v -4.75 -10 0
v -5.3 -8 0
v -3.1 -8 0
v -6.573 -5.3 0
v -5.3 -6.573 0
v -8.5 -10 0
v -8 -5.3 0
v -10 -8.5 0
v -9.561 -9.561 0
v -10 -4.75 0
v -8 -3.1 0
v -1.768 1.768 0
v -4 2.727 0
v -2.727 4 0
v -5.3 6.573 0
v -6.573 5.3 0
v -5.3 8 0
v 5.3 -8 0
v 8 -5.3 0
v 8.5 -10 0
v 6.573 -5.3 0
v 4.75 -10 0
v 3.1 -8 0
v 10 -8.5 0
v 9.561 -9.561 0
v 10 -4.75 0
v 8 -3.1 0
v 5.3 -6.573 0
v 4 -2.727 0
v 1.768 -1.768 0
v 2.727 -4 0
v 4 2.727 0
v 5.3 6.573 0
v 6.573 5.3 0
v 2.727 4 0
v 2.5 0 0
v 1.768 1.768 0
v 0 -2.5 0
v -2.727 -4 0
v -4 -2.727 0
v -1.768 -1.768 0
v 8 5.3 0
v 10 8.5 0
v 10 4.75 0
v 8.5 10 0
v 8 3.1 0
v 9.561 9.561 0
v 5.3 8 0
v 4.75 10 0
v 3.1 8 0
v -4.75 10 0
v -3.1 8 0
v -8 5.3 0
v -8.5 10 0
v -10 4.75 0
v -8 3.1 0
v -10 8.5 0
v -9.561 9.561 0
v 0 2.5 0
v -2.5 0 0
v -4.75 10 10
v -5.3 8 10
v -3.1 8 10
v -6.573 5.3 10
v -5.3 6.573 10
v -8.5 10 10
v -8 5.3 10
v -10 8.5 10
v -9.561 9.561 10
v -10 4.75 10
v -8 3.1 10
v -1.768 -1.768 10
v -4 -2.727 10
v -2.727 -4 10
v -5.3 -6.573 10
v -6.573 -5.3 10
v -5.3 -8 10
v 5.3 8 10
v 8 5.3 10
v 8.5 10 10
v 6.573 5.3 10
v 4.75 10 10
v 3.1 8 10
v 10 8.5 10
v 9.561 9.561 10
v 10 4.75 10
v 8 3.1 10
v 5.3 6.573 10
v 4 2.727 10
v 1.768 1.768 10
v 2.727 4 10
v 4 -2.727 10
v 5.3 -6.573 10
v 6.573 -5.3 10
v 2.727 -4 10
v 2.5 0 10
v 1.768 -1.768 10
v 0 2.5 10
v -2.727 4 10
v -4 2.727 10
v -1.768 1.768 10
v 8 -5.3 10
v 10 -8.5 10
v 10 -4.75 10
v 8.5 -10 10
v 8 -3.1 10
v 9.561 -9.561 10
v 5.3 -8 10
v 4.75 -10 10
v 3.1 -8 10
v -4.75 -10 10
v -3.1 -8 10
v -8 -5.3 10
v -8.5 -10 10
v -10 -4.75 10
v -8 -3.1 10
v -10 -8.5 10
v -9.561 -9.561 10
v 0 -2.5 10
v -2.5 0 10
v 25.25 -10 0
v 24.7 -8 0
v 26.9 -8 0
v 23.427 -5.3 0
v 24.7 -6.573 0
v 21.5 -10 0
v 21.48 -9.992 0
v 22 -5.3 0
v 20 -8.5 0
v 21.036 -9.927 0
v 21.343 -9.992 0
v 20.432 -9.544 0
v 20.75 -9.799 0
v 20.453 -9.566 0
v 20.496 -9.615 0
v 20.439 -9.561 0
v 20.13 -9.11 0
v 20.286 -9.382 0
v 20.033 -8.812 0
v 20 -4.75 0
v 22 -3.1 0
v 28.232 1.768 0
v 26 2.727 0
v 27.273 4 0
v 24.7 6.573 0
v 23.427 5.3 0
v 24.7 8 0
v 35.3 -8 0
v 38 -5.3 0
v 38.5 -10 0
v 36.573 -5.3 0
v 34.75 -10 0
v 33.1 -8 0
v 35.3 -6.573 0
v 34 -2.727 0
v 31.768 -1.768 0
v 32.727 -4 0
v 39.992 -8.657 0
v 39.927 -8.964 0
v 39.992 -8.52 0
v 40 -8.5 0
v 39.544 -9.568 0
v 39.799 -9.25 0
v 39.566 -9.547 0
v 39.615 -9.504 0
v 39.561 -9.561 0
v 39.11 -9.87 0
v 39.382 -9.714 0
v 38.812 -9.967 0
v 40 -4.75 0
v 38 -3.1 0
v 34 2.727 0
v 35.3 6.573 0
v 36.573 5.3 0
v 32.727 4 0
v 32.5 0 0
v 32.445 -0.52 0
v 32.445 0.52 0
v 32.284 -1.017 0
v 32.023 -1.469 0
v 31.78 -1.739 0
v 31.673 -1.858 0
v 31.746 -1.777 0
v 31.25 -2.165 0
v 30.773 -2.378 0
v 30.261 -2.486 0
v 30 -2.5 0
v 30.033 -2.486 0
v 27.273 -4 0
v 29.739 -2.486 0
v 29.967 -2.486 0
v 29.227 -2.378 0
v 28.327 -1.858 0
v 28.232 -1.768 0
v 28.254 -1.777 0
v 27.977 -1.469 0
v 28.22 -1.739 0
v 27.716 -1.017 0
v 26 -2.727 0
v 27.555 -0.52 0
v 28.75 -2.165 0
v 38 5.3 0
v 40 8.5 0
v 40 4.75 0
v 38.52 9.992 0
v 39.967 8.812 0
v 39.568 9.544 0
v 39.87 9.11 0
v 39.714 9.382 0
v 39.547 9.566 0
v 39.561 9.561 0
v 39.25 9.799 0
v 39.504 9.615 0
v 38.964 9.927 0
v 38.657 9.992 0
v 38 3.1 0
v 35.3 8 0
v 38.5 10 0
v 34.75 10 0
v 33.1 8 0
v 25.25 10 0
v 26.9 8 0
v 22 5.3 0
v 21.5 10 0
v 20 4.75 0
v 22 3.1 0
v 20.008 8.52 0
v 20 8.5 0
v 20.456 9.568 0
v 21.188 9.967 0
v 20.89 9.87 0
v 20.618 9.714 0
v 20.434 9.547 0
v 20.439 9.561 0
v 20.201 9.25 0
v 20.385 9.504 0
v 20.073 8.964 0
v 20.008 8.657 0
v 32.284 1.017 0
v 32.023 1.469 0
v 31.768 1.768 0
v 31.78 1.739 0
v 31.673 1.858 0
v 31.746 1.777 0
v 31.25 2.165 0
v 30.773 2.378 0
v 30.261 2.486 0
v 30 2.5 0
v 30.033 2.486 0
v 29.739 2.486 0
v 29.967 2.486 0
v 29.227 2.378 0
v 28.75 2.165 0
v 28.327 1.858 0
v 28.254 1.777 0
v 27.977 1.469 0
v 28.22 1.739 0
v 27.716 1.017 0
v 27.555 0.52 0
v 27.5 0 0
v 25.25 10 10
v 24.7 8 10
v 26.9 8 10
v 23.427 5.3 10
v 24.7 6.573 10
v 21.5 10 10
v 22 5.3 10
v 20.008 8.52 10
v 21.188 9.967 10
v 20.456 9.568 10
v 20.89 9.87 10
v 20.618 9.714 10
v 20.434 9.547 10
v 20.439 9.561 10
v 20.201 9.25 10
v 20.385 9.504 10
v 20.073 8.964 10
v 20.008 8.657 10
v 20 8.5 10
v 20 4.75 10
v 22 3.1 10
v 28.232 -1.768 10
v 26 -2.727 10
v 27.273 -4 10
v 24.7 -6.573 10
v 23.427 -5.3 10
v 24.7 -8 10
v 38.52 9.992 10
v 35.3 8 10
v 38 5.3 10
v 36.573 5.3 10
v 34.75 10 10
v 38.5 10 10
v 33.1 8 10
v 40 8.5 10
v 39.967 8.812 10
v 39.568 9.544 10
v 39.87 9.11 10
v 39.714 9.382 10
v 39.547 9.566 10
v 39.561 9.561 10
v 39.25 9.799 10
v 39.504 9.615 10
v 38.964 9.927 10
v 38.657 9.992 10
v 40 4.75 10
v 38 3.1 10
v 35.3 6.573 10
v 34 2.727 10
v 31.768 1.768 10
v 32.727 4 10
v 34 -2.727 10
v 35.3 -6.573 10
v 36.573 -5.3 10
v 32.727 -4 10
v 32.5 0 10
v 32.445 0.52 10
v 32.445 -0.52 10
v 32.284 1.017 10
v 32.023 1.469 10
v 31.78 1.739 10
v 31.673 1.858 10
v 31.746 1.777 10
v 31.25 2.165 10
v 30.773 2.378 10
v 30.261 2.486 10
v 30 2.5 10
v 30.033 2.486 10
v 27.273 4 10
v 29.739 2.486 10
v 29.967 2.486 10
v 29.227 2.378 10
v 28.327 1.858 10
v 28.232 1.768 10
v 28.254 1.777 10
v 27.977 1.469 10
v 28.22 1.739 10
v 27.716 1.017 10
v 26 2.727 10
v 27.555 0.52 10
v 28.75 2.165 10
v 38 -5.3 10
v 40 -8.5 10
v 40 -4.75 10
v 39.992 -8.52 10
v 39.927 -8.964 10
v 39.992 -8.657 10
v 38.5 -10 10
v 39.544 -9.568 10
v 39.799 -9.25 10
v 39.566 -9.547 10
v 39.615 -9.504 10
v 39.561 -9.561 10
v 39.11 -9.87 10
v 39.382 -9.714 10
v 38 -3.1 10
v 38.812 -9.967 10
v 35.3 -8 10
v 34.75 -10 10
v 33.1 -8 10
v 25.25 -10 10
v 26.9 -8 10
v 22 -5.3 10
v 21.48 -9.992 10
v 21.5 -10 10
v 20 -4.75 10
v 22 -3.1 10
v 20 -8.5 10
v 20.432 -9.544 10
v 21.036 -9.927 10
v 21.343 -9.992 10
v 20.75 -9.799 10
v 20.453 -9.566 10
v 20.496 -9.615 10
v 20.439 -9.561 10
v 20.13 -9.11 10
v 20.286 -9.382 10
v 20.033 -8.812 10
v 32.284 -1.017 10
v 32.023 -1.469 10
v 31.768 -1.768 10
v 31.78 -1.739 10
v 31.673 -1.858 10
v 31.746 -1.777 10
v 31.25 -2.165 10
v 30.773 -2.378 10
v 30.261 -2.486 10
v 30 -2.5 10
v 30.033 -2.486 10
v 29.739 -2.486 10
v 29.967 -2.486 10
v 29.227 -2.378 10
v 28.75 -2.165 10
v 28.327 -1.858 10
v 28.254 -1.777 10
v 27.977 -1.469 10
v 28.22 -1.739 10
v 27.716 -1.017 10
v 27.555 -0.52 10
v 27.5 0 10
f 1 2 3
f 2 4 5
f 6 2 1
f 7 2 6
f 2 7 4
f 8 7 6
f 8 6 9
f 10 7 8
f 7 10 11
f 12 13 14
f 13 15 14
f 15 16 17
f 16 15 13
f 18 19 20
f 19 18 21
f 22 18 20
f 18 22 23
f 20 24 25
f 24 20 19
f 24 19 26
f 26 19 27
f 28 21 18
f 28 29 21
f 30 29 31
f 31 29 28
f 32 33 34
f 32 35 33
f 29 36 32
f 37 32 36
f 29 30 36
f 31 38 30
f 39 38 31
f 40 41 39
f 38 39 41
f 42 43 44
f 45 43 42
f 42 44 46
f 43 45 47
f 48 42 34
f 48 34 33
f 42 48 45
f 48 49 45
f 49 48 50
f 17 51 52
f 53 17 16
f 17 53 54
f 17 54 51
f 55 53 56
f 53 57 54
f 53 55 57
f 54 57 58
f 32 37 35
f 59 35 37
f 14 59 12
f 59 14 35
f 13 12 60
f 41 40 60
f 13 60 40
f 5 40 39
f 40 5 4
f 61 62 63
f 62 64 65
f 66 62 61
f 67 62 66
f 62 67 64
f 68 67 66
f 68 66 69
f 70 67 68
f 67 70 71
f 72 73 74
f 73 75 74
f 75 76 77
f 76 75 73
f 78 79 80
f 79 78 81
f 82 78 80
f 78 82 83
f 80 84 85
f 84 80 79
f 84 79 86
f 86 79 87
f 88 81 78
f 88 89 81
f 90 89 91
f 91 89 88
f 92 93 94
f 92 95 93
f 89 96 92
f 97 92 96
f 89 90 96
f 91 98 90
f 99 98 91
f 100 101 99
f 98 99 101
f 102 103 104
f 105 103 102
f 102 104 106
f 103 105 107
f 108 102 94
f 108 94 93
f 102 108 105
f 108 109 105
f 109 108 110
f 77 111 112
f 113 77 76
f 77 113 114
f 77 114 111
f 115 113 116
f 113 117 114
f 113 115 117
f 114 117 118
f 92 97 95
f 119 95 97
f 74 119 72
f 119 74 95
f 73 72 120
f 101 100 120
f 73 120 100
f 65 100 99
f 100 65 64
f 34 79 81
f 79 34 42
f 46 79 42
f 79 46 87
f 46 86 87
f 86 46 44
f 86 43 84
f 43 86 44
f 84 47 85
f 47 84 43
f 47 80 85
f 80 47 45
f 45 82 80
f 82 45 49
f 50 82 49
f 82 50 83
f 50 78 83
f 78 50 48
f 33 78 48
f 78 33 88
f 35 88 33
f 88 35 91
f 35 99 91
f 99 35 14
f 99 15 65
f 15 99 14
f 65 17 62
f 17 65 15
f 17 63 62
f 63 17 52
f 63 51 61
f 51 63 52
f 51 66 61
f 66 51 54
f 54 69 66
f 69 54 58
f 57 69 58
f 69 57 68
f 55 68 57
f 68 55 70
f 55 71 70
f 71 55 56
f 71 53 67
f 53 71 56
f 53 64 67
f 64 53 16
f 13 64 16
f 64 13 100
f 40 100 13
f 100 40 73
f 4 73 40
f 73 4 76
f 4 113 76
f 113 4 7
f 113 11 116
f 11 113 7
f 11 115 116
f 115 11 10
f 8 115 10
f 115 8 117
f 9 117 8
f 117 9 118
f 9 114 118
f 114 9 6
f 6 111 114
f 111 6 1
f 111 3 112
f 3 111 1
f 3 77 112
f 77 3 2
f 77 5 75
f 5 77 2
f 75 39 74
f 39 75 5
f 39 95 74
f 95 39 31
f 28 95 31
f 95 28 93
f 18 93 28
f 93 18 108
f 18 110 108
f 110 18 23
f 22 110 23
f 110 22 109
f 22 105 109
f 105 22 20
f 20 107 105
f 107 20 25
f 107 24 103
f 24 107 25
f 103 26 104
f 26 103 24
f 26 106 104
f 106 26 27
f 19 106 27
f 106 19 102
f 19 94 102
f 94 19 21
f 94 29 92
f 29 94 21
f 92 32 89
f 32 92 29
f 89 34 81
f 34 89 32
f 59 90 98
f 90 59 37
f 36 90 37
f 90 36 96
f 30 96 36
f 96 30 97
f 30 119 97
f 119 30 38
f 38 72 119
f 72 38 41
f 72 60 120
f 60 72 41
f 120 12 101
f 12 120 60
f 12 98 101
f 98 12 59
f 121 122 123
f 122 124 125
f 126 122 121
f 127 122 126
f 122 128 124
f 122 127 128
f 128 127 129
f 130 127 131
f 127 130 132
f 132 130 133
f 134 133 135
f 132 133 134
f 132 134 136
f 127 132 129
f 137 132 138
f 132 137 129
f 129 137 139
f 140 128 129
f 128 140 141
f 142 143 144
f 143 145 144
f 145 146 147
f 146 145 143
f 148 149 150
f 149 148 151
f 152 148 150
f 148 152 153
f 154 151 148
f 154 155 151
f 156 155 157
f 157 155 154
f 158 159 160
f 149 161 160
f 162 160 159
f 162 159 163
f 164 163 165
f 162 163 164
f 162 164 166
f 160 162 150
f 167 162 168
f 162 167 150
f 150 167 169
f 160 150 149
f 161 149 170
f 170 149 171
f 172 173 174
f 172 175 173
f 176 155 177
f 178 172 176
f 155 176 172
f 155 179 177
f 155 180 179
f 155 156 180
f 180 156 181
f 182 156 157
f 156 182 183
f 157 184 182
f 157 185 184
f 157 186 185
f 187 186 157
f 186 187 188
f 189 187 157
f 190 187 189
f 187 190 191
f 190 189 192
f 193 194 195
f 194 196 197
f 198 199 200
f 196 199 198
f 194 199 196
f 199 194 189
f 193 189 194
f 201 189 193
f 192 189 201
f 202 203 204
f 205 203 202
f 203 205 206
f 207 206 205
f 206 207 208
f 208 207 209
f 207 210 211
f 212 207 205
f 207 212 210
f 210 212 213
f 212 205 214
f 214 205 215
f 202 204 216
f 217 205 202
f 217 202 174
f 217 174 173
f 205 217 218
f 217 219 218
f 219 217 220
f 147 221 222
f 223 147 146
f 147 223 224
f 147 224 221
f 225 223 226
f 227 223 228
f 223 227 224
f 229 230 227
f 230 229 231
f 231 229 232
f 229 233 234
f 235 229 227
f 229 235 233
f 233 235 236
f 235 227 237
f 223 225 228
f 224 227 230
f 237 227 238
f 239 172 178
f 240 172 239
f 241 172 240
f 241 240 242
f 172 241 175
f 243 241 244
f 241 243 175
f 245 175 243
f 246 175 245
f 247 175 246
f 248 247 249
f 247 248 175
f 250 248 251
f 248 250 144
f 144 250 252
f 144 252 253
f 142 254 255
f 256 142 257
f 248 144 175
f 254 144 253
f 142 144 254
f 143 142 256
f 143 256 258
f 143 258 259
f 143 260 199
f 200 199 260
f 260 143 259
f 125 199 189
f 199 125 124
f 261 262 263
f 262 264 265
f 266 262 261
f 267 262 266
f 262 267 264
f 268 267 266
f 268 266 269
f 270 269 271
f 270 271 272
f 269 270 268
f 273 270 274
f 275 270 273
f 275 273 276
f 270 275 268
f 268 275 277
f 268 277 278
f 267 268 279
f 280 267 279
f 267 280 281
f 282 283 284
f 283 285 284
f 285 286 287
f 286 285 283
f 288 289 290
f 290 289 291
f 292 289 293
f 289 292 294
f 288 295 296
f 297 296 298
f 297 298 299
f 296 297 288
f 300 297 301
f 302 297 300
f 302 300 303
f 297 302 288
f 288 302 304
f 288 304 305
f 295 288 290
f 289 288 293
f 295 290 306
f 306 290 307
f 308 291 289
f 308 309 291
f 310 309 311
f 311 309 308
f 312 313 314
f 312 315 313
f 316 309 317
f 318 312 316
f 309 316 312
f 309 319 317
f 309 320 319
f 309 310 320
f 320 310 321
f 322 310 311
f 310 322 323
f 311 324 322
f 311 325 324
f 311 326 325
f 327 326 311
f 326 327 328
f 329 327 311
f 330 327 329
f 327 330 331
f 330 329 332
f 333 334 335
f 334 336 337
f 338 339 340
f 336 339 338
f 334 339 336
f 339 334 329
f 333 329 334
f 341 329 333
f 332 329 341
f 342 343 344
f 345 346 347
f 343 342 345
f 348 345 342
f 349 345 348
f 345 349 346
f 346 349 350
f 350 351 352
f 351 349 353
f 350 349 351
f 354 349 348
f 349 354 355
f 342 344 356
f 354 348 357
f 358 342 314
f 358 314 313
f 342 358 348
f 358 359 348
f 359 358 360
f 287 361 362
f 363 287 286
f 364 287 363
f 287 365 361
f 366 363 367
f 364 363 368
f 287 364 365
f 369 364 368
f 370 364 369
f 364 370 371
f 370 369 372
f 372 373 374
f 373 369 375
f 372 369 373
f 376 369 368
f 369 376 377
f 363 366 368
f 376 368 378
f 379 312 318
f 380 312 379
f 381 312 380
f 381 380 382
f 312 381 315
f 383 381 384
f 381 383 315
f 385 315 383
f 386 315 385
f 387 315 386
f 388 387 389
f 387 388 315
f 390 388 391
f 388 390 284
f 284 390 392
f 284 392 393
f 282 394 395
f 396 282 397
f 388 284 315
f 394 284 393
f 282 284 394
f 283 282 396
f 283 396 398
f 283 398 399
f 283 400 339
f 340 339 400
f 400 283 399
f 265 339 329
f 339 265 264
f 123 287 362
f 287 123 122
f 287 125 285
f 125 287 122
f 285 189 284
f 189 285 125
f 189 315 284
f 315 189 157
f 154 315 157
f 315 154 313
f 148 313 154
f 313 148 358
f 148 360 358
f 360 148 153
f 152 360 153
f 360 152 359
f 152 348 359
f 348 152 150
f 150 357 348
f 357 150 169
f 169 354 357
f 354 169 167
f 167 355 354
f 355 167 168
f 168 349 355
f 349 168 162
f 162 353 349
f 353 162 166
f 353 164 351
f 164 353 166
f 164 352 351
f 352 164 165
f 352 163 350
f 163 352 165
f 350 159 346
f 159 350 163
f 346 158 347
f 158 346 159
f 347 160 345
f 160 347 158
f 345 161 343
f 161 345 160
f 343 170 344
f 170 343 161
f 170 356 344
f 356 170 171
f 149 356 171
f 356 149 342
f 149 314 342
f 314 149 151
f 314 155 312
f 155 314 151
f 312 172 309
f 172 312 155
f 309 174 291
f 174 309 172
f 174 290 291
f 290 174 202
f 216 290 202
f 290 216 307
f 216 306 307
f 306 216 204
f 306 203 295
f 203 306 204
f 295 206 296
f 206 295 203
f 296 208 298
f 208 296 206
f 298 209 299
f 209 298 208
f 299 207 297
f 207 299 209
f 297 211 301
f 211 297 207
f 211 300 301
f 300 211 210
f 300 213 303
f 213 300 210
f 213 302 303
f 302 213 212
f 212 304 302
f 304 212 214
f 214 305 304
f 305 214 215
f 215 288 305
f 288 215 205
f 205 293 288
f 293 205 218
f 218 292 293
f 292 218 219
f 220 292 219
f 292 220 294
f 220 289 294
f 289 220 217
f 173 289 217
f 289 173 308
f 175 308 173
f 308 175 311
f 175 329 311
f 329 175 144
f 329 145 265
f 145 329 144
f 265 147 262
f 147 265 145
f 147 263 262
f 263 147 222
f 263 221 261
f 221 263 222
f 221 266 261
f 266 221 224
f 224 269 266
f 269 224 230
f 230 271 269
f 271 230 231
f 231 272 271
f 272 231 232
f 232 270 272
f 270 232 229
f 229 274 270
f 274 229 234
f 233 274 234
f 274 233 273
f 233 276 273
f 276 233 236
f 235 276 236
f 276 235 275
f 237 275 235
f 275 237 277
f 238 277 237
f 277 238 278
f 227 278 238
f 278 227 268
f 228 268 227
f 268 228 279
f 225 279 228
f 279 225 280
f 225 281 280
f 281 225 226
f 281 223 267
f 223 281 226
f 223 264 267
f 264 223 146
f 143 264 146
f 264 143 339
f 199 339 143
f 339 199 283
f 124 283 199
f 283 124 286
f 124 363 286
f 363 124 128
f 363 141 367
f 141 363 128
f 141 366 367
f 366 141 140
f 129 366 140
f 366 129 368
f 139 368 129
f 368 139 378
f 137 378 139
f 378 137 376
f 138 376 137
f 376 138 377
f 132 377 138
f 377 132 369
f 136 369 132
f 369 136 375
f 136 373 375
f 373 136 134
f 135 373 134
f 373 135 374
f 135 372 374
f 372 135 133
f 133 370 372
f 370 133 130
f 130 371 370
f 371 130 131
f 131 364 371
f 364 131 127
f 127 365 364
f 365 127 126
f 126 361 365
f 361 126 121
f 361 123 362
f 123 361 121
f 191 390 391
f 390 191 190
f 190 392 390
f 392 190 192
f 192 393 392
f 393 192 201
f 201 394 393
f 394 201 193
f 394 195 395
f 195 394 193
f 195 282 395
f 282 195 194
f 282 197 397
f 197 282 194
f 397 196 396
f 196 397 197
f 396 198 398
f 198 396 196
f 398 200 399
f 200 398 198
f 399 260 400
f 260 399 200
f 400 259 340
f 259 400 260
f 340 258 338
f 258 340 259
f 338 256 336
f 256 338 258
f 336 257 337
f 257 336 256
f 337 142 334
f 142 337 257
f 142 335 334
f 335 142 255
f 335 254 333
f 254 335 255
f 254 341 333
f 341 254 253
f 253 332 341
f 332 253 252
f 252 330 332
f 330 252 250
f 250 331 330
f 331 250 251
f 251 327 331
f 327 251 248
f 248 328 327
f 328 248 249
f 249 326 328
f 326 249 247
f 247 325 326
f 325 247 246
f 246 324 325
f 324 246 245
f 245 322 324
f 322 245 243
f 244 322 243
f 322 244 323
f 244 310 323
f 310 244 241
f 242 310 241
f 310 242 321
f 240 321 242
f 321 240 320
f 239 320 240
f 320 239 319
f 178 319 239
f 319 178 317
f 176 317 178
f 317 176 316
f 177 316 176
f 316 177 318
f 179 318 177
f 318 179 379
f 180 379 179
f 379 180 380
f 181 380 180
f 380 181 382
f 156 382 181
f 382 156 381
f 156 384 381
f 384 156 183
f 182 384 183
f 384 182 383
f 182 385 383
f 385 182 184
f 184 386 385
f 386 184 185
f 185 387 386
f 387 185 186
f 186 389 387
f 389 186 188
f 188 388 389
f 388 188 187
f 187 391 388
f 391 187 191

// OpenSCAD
// Aleksandr Saechnikov 17 june 2015

extrusion_profile_20x20_v_slot(size = 20, height = 10);
translate([30, 0, 0]) extrusion_profile_20x20_v_slot_smooth(size = 20, height = 10);

$fn = 30;

module extrusion_profile_20x20_v_slot(size = 20, height = 10) {
	echo("2020 profile", height);
	color([0.7, 0.7, 0.7]) linear_extrude(height = height) {
		union() {
			extrusion_profile_20x20_v_slot_part(size);
			rotate([0, 0, 90]) extrusion_profile_20x20_v_slot_part(size);
			rotate([0, 0, 180]) extrusion_profile_20x20_v_slot_part(size);
			rotate([0, 0, 270]) extrusion_profile_20x20_v_slot_part(size);
		}
	}
}

module extrusion_profile_20x20_v_slot_part(size = 20) {
	d = 5;
	r = 1.5;
	s1 = 1.8;
	s2 = 2;
	s3 = 6;
	s4 = 6.2;
	s5 = 9.5;
	s6 = 10.6;
	s7 = 20;

	reSize = size / 20; // Scalling

	k0 = 0;
	k1 = d * 0.5 * cos(45) * reSize;
	k2 = d * 0.5 * reSize;
	k3 = ((s7 * 0.5 - s3) - s1 * 0.5 * sqrt(2)) * reSize;
	k4 = s4 * 0.5 * reSize;
	k5 = (s7 * 0.5 - s3) * reSize;
	k6 = s6 * 0.5 * reSize;
	k7 = (s6 * 0.5 + s1 * 0.5 * sqrt(2)) * reSize;
	k8 = (s7 * 0.5 - s2) * reSize;
	k9 = s5 * 0.5 * reSize;
	k10 = s7 * 0.5 * reSize;
	k10_1 = k10 - r * (1 - cos(45)) * reSize;
	k10_2 = k10 - r * reSize;

	polygon(points = [
		[k1, k1],
		[k0, k2],
		[k0, k5],
		[k3, k5],
		[k6, k7],
		[k6, k8],
		[k4, k8],
		[k9, k10],
		[k10_2, k10],
		[k10_1, k10_1],
		[k10, k10_2],
		[k10, k9],
		[k8, k4],
		[k8, k6],
		[k7, k6],
		[k5, k3],
		[k5, k0],
		[k2, k0]
	]);
}

module extrusion_profile_20x20_v_slot_smooth(size = 20, height = 10) {
	linear_extrude(height = height) {
		difference() {
			union() {
				extrusion_profile_20x20_v_slot_part_smooth(size);
				rotate([0, 0, 90]) extrusion_profile_20x20_v_slot_part_smooth(size);
				rotate([0, 0, 180]) extrusion_profile_20x20_v_slot_part_smooth(size);
				rotate([0, 0, 270]) extrusion_profile_20x20_v_slot_part_smooth(size);
			}
			circle([0, 0], r = size / 20. * 2.5);
		}
	}
}

module extrusion_profile_20x20_v_slot_part_smooth(size = 20) {
	r_center = 0.5 * size - 1.5 * size / 20;
	union() {
		translate([r_center, r_center]) circle(r = 1.5 * size / 20);
		extrusion_profile_20x20_v_slot_part(size);
	}
}
